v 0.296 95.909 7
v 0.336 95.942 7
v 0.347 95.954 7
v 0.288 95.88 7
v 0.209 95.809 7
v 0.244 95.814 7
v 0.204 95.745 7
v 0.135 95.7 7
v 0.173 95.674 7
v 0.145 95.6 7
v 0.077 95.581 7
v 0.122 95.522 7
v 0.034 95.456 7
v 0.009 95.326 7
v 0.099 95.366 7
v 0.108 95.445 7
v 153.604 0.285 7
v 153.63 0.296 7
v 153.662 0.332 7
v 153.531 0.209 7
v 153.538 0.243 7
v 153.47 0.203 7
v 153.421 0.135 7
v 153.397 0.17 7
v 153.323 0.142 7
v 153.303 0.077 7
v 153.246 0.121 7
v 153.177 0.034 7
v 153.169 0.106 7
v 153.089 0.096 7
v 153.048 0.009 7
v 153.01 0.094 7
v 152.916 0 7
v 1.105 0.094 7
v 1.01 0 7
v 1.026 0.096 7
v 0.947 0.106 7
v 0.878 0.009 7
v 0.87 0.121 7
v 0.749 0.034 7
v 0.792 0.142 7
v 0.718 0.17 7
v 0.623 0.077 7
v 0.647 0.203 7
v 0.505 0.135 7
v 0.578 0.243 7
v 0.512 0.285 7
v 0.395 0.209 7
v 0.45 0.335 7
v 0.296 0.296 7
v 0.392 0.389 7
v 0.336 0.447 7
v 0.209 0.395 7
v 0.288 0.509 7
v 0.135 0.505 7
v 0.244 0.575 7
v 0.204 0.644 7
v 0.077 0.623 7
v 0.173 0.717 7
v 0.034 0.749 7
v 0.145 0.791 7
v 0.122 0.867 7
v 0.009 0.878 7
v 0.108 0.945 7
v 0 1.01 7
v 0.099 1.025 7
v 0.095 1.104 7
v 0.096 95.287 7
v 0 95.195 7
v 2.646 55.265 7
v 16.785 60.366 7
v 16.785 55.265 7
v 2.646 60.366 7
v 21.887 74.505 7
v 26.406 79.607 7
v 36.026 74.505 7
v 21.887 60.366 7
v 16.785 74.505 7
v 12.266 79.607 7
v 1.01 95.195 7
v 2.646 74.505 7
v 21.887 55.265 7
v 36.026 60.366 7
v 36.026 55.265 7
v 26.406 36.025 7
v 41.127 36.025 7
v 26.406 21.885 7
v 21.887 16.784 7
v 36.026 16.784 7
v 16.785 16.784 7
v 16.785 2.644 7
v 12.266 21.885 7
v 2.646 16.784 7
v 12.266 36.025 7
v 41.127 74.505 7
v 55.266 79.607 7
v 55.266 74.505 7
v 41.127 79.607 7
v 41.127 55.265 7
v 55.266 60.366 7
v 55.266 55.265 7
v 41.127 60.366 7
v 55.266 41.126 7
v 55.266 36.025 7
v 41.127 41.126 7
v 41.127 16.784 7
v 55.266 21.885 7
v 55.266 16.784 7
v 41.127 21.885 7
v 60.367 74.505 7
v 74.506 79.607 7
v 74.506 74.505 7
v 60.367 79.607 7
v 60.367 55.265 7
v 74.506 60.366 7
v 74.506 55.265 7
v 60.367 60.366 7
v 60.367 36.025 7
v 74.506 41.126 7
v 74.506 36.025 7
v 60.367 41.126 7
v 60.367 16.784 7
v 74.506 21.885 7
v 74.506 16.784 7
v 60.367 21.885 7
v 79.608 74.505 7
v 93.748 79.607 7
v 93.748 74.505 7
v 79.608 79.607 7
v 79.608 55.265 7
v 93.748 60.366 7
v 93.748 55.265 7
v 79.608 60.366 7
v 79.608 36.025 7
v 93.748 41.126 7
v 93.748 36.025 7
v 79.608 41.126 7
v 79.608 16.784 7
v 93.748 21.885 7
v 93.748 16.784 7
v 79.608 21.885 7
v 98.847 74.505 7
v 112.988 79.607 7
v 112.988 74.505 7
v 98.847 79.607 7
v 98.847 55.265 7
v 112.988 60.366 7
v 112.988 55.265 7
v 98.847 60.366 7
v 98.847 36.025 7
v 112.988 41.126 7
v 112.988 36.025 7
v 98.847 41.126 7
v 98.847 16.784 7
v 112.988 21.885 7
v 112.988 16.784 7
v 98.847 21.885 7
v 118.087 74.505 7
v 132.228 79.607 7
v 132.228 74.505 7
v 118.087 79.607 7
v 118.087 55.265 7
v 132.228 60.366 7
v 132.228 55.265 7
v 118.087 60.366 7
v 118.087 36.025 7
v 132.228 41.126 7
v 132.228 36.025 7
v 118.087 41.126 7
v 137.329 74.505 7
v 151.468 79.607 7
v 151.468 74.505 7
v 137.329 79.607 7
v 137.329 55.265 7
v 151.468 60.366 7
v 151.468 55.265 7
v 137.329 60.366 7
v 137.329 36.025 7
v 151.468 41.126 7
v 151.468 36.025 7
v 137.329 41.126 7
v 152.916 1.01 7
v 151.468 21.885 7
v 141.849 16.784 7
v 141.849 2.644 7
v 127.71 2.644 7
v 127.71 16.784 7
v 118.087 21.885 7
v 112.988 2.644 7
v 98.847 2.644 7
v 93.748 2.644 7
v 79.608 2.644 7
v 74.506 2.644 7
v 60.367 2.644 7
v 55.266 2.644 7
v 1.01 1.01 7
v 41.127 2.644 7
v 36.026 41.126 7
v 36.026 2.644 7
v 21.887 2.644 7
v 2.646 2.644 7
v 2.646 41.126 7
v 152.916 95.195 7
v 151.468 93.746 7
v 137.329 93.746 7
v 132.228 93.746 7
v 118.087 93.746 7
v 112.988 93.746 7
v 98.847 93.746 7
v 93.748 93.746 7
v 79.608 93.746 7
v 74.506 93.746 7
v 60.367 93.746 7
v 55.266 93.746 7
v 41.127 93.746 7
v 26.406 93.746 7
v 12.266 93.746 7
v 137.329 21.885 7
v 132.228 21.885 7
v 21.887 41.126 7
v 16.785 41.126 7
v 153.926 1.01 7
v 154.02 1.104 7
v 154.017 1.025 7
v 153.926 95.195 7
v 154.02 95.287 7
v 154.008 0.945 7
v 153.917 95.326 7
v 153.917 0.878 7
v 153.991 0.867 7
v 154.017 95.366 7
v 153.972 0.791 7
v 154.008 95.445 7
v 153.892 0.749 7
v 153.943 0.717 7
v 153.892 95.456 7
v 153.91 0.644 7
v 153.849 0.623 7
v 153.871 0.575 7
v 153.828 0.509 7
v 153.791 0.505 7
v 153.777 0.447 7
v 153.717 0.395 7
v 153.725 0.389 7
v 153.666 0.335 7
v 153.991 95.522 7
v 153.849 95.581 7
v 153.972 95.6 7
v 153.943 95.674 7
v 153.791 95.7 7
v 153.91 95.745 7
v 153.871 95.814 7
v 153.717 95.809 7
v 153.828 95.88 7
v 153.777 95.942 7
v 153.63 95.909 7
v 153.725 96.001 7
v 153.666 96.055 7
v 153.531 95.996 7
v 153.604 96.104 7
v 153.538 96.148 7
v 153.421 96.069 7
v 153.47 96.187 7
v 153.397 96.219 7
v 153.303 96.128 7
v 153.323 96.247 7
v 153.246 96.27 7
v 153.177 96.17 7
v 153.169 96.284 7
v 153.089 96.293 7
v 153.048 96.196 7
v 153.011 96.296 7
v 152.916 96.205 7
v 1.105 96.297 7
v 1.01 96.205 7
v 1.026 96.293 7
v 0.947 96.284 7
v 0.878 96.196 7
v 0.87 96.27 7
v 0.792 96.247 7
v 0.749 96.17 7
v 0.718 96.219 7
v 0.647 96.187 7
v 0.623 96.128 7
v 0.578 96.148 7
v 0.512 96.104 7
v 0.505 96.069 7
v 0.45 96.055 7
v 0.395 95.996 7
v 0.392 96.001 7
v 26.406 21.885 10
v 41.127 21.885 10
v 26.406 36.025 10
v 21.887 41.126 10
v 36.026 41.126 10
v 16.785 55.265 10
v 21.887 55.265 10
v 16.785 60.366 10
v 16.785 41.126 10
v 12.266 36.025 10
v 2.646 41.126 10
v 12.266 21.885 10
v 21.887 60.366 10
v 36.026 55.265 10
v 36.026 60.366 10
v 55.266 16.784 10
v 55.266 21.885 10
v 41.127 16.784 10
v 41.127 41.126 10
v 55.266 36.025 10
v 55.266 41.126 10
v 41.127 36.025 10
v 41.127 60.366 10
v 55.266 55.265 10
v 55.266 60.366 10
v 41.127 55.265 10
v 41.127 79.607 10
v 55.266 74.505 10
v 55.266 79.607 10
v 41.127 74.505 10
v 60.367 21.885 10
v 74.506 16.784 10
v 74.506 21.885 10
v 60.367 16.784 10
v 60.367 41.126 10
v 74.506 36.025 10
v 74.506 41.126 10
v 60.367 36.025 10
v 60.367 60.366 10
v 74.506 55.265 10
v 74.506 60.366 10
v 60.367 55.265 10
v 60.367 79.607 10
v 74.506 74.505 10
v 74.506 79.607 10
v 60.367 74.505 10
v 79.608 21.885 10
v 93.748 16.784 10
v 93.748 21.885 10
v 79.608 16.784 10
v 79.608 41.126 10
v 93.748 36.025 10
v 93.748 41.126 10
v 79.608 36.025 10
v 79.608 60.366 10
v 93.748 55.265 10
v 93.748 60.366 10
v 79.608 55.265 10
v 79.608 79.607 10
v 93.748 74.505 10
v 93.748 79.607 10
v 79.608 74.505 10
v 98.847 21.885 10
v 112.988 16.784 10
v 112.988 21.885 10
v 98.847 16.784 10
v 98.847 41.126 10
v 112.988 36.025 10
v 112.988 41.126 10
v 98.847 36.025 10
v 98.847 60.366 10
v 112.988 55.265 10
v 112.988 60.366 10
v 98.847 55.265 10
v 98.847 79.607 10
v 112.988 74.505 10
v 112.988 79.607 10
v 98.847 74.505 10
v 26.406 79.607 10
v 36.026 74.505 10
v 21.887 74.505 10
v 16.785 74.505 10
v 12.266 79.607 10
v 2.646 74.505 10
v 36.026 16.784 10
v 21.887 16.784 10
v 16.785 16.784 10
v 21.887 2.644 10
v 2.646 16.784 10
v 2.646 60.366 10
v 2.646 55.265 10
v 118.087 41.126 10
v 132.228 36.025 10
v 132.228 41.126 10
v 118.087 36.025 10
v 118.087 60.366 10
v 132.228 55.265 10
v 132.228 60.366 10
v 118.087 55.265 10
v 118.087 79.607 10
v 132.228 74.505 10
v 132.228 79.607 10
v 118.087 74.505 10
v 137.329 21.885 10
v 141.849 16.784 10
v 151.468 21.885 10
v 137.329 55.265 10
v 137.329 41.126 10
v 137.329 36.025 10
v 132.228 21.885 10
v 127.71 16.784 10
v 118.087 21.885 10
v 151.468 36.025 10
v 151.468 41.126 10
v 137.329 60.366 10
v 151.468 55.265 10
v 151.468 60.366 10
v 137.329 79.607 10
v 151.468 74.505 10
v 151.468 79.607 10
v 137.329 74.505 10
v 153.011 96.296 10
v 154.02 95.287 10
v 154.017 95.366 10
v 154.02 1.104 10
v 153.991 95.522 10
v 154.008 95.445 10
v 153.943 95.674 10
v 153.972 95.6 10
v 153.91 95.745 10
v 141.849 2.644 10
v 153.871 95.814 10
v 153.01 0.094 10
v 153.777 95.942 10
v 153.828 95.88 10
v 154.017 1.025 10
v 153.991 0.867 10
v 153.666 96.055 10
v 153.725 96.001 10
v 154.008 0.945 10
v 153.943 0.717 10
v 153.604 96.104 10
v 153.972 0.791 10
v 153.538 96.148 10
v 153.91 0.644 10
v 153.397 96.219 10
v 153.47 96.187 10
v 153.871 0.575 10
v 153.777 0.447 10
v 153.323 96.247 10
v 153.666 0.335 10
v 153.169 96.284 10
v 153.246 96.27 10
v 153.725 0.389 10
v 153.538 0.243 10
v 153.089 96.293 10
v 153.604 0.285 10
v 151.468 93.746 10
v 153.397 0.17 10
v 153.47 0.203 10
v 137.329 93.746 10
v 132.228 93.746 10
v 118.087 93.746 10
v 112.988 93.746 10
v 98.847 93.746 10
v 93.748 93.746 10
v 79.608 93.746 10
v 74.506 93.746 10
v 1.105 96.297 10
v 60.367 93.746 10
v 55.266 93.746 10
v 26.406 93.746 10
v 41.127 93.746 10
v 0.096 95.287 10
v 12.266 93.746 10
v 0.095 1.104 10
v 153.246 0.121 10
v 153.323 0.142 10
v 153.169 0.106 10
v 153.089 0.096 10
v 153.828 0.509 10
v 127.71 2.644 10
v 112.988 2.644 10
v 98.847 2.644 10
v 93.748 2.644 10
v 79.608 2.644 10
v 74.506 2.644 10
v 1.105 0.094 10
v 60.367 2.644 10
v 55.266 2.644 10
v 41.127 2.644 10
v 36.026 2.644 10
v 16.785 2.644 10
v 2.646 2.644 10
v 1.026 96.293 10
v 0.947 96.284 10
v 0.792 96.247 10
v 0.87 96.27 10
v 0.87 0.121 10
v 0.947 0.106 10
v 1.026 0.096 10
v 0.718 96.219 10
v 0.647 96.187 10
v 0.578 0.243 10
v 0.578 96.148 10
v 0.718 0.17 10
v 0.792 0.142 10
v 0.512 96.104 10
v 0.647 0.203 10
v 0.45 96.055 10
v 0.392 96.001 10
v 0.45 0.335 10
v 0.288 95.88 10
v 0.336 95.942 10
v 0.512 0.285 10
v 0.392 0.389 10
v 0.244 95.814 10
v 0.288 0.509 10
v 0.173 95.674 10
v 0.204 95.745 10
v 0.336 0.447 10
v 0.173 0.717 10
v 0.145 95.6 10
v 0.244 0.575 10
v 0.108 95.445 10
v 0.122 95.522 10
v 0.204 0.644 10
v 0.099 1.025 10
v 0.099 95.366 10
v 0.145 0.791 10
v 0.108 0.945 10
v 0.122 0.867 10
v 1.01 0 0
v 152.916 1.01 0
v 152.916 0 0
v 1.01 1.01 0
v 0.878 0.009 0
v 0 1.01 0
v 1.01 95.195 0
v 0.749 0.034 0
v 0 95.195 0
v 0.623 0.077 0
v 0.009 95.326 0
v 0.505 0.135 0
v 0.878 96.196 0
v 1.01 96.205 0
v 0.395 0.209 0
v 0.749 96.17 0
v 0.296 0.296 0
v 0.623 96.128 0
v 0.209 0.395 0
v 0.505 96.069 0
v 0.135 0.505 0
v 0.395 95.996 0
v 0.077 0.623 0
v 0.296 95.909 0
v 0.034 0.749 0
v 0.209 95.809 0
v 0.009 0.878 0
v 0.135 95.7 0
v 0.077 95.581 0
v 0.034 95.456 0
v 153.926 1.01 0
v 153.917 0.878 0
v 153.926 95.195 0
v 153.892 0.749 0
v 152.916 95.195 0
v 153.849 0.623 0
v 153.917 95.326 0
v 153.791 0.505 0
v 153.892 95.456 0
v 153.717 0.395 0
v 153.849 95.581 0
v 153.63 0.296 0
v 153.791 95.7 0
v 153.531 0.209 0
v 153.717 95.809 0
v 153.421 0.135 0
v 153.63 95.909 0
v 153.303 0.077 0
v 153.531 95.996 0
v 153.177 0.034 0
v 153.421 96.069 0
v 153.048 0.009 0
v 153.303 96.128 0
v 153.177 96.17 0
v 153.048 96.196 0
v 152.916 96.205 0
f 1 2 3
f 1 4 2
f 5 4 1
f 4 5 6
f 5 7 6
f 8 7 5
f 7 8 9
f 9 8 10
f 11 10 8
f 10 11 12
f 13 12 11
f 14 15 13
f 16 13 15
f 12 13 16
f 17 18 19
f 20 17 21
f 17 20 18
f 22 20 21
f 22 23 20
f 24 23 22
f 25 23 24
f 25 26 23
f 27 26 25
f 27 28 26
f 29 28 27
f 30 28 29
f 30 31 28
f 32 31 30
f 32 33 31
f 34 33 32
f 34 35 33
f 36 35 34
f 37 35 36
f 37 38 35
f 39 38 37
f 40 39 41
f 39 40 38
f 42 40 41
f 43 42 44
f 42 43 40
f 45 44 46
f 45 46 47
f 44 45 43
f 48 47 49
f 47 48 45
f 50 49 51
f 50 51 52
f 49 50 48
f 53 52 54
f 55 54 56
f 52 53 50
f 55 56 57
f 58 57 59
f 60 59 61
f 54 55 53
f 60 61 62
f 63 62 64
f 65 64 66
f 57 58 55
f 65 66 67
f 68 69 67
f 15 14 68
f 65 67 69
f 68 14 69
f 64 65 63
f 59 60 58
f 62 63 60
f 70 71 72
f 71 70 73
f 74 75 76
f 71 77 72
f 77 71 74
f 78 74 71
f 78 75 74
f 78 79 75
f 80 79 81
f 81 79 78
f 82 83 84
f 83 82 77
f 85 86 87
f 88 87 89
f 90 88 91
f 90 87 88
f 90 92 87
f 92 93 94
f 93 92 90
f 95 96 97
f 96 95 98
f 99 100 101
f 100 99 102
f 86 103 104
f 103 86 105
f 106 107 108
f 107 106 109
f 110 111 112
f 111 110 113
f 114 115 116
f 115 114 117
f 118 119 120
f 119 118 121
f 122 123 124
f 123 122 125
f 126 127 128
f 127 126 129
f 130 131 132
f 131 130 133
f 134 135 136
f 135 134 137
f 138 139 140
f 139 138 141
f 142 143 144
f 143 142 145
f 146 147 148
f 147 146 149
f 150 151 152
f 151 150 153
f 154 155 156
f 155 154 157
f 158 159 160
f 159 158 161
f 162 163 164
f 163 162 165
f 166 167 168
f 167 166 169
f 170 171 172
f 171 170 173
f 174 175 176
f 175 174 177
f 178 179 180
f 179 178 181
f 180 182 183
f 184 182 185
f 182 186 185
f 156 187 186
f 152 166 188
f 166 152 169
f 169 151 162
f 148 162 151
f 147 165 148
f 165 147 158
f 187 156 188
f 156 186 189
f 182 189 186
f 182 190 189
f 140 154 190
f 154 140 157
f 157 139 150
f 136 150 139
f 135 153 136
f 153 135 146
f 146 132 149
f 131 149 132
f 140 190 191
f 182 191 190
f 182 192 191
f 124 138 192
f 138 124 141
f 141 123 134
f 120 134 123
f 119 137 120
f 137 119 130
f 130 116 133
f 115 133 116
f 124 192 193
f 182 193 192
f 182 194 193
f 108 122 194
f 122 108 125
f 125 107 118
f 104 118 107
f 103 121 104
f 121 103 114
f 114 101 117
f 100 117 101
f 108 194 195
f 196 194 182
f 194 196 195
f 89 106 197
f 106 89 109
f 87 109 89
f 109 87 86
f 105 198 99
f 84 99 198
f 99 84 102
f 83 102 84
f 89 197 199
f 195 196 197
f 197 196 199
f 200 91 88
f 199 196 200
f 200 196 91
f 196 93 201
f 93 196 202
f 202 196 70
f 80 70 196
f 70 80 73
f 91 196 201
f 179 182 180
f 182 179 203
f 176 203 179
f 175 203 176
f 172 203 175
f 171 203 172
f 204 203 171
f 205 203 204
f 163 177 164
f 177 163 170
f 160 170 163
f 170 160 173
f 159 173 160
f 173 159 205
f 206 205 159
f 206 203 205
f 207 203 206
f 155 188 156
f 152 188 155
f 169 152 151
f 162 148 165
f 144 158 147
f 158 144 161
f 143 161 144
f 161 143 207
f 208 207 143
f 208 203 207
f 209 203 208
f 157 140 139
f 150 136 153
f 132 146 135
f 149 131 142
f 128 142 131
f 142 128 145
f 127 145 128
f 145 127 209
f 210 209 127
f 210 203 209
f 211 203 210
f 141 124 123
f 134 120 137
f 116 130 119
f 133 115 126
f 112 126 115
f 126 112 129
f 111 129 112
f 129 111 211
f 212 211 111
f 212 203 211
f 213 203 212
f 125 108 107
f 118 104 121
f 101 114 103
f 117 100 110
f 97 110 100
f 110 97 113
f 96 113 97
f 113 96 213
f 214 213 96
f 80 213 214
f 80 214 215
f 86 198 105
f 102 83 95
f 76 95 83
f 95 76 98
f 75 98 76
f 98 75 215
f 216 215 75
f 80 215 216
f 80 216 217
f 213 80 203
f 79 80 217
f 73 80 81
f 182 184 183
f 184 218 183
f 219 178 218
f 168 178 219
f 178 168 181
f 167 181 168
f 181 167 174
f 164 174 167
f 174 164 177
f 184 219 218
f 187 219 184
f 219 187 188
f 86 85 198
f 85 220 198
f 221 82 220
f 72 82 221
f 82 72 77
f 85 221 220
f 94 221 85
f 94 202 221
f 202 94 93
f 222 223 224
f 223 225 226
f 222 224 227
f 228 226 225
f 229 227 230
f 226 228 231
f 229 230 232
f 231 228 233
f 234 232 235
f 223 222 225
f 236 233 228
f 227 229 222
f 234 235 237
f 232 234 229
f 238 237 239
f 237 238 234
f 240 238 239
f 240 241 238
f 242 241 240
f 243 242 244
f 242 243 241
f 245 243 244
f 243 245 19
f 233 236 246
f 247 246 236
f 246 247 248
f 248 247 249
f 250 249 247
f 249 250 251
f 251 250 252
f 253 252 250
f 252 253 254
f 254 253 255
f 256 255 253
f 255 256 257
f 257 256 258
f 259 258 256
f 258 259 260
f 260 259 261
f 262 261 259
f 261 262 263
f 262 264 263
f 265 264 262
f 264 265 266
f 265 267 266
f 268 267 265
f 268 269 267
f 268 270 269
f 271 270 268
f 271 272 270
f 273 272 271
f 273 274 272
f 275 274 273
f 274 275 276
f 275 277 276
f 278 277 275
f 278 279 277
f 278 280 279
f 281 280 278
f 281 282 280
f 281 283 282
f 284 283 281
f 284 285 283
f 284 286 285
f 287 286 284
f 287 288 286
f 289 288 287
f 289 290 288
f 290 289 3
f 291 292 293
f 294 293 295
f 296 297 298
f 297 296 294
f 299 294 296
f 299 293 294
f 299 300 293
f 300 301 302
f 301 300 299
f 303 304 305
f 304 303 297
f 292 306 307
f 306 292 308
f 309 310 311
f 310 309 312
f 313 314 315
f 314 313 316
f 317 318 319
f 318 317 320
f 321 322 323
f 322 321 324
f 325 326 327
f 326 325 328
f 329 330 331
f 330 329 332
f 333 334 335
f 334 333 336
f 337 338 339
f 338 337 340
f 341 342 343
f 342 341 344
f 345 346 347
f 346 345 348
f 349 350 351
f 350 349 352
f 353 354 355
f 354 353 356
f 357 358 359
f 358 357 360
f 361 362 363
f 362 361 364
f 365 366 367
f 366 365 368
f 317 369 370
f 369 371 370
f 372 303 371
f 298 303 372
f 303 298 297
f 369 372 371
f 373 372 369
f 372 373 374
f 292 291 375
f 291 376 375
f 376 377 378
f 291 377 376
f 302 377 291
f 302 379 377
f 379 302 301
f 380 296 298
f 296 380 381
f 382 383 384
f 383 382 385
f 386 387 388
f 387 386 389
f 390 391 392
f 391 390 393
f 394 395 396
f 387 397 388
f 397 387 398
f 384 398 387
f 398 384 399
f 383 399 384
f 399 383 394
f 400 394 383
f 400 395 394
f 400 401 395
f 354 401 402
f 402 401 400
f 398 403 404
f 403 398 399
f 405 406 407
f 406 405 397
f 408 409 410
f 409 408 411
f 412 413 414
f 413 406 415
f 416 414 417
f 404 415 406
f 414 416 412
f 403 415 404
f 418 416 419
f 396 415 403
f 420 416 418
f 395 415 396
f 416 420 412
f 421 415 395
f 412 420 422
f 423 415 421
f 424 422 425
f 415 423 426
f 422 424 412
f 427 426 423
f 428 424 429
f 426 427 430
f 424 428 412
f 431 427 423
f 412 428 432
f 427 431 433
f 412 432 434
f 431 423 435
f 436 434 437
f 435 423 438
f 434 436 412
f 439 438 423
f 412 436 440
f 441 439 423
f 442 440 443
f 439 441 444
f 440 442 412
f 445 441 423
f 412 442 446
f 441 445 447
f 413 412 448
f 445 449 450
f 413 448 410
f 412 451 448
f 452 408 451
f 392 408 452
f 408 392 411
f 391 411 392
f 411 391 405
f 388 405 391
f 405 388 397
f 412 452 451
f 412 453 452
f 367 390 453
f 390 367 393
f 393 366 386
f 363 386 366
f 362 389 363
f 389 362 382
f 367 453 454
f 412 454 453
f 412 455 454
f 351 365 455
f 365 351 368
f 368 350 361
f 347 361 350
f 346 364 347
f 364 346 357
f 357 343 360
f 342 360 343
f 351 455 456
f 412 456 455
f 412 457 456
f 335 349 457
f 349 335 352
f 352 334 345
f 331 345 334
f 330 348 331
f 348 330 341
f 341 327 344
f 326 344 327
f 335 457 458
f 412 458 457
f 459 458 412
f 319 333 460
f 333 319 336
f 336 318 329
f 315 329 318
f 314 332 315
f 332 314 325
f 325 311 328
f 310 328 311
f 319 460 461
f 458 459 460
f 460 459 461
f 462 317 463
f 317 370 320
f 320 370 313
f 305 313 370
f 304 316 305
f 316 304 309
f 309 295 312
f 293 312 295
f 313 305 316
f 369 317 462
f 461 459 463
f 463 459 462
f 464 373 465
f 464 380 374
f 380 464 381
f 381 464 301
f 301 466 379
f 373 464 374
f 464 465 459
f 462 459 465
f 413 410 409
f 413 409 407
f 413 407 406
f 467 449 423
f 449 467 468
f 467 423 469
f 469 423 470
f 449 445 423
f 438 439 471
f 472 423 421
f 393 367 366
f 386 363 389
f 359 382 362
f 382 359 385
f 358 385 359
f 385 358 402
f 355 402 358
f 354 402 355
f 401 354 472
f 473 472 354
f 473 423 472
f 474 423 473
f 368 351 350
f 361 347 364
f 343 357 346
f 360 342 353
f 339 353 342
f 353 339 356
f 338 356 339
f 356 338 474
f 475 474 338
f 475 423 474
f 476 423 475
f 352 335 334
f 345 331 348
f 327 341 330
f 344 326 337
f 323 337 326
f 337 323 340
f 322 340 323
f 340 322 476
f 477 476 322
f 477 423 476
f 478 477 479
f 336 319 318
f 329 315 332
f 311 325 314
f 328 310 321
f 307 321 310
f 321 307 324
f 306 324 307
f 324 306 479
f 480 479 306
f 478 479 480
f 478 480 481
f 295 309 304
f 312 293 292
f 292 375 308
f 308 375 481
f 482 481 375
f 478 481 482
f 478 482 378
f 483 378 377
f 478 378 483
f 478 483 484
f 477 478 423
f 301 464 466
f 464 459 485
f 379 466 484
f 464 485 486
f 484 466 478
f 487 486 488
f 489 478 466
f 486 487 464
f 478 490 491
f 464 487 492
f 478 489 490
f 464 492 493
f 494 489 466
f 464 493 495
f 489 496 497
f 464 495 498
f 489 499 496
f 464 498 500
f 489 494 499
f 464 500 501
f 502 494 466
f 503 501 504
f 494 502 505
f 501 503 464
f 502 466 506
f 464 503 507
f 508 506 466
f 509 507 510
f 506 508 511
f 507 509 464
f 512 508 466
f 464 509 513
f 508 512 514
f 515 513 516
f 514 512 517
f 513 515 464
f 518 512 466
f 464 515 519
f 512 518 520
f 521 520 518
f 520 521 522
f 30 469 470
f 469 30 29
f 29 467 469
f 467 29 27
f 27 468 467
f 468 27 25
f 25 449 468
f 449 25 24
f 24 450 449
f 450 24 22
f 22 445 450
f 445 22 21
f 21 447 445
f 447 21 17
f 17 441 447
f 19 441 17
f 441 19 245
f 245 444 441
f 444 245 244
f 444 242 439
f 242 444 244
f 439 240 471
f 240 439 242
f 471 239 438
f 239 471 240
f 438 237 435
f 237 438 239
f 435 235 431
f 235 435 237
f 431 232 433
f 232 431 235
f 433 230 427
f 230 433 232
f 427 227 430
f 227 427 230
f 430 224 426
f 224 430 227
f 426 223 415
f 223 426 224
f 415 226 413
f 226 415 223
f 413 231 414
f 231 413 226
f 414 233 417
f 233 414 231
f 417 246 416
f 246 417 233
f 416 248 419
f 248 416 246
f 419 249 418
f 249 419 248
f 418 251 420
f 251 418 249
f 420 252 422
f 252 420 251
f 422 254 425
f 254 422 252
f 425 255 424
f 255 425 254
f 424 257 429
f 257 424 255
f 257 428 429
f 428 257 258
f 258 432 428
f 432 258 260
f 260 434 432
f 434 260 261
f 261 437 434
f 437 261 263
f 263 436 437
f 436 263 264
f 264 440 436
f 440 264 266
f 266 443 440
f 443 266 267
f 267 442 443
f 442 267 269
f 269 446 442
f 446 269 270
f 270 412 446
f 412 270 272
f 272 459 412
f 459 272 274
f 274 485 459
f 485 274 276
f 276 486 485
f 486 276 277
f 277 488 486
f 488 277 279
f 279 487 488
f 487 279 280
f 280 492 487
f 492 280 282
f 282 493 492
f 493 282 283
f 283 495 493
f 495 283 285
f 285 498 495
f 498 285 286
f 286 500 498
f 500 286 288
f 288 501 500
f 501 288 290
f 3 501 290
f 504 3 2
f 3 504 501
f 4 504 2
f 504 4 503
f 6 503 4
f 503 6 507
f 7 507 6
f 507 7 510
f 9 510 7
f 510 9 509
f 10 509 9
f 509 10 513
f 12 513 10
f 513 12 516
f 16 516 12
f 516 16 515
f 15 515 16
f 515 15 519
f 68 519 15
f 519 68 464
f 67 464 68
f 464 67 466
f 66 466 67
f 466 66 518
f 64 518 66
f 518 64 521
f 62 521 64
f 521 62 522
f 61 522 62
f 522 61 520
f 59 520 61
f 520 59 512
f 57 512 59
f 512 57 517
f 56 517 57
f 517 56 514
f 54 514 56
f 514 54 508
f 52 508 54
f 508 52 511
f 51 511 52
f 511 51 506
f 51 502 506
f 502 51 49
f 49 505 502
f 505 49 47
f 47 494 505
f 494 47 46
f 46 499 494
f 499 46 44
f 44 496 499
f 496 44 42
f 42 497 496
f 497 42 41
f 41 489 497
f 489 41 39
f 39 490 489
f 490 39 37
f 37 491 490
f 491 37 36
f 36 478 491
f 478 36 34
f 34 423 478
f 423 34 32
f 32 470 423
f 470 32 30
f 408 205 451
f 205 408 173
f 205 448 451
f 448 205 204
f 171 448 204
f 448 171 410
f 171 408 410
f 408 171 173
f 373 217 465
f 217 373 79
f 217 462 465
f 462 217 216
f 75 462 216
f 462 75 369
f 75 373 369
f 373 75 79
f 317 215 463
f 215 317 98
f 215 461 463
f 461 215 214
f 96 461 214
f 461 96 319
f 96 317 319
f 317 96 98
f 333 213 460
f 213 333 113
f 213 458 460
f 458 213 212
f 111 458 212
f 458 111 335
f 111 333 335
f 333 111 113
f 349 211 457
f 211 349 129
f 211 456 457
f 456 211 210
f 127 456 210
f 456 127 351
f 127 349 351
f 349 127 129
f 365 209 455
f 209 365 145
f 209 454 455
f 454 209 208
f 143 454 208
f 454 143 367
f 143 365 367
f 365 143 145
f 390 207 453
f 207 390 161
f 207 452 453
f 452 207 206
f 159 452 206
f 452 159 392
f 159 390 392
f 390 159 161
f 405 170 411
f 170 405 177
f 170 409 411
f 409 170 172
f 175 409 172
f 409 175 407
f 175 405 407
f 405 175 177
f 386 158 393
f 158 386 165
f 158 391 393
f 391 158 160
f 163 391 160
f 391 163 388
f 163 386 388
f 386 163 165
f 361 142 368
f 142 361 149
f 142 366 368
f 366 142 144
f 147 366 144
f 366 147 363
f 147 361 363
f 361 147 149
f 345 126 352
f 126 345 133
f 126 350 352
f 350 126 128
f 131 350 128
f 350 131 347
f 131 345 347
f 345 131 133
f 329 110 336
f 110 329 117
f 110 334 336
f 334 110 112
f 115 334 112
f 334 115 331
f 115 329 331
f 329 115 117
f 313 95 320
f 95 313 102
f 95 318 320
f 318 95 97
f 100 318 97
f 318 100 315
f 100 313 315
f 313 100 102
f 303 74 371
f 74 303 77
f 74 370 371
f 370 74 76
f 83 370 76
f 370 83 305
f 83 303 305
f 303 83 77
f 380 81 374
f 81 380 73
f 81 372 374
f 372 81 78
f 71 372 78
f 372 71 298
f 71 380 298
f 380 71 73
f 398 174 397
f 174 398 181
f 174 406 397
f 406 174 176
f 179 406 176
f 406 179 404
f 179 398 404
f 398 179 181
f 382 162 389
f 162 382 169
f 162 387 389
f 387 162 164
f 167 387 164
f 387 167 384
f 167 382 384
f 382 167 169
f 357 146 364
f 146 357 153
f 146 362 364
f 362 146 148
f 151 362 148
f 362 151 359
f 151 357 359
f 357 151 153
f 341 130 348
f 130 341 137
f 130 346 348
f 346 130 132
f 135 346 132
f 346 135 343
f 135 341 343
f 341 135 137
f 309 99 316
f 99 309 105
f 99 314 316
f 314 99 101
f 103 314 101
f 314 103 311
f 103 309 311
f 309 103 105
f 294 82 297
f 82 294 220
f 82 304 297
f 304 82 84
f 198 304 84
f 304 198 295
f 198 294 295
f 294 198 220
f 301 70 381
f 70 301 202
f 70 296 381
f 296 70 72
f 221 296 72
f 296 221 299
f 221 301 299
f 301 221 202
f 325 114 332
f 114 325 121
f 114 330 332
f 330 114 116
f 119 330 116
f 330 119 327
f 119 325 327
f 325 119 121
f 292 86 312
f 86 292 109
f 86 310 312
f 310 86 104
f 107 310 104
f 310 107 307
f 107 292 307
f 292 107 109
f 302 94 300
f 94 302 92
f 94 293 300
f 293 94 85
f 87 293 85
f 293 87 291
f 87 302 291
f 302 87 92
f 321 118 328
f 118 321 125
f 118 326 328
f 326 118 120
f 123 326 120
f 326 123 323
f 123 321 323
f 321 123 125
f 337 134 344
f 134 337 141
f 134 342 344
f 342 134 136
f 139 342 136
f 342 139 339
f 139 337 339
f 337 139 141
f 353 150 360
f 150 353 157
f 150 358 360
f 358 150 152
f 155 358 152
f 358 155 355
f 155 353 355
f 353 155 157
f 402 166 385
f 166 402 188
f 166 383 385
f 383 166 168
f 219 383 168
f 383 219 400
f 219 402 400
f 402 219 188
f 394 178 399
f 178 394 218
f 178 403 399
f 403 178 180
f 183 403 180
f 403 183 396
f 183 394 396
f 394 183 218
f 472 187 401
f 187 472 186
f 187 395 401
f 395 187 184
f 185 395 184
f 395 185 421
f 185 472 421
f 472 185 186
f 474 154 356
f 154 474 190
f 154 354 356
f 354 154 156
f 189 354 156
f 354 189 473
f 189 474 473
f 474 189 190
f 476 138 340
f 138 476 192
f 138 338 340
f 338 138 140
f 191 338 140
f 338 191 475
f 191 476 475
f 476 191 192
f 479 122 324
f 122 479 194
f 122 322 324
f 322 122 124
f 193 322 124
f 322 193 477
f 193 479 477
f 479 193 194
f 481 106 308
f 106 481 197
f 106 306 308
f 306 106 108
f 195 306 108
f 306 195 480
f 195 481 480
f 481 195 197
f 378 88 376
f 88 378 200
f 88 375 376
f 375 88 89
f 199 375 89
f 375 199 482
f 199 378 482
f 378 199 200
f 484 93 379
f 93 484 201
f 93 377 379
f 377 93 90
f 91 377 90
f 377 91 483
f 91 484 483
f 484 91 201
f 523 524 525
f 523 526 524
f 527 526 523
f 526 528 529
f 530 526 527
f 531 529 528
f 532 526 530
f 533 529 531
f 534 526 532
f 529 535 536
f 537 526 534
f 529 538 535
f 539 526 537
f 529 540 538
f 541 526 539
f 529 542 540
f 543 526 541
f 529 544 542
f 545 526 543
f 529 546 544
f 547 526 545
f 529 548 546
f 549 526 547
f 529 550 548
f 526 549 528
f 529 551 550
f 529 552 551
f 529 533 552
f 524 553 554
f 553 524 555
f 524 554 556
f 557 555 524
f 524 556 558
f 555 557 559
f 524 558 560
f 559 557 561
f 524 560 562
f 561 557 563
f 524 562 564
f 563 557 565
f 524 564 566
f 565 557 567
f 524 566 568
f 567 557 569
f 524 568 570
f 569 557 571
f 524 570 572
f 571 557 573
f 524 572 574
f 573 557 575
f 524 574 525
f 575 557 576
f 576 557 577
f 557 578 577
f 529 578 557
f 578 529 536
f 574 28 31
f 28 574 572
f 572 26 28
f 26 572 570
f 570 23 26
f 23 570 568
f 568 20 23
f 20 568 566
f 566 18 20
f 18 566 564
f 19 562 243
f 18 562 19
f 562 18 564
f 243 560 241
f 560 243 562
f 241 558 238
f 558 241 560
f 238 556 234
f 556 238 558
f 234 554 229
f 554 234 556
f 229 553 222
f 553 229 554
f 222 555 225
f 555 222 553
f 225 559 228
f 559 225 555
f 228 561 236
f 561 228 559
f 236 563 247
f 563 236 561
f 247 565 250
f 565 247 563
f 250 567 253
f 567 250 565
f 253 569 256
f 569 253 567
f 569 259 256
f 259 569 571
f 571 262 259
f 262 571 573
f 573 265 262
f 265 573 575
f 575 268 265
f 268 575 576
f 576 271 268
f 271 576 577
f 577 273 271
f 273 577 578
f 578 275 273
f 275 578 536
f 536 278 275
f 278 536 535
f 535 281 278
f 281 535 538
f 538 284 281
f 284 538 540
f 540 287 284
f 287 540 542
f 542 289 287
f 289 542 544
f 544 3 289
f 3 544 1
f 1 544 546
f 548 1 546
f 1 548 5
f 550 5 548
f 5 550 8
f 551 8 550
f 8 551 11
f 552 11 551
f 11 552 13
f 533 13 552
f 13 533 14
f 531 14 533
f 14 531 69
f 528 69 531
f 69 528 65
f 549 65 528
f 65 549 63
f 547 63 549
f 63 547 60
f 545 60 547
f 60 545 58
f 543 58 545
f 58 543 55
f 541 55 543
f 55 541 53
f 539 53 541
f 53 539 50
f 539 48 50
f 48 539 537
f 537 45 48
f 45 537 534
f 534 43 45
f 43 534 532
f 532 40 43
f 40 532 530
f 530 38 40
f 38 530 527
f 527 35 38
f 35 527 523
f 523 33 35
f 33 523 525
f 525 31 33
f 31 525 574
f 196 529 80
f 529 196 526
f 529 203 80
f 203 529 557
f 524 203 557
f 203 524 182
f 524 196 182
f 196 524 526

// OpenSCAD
// file: plate.scad
// Thickness of entire plate
plate_thickness=3;
// Unit square length, from Cherry MX data sheet
unit=19.05;
// Hole size. 14 is standard
hole_size=14.2;


// length, in units, of board
width_in_units=15;
// Height, in units, of board
height_in_units=5;

// Radius of mounting holes
mounting_hole_radius=2;

// whether to use the fancy cutout switches
fancy_hole = false;


// height of switch clasp cutouts
cutout_height = 3;
// width of switch clasp cutouts
cutoutwidth = 1;

//calculated vars
width=width_in_units*unit;
height=height_in_units*unit;

sixty_percent_holes = [[1+1/3,3.5], [13+2/3,3.5], [6.75,2.5], [6.75,2.5], [14.8,2], [.2,2], [10,0.5]];

module plate(width, height, thickness){
	cube([width,height,thickness]);
}

module switch_hole(){
	cube([hole_size,hole_size,plate_thickness]);

	if(fancy_hole){
		translate([-cutoutwidth,1,0])
		cube([hole_size+2*cutoutwidth,cutout_height,plate_thickness]);

		translate([-cutoutwidth,hole_size-cutoutwidth-cutout_height,0])
		cube([hole_size+2*cutoutwidth,cutout_height,plate_thickness]);
	}
}

module hole_matrix(holes,startx,starty){
	for (key = holes){
		translate([startx+unit*key[0], starty-unit*key[1], 0]){
			translate([(unit*key[2]-hole_size)/2,(unit - hole_size)/2, 0]){
				switch_hole();
			}
		}
	}
}

module mounting_holes(holes){
	for (hole = holes) {
		translate([hole[0] * unit, hole[1] * unit]) {
			cylinder(h=plate_thickness,r=mounting_hole_radius, $fn=12);
		}
	}
}

module full_plate(width, height, key_holes, mounting_holes=sixty_percent_holes){
	difference(){
		plate(width,height);
		hole_matrix(key_holes,0,height-unit);
		mounting_holes(mounting_holes);
	}
}
// main file
include <plate.scad>

//poker keyboard layout layer
key_holes = [
//start ROW 0
[0,0,1], [1,0,1], [2,0,1], [3,0,1], [4,0,1], [5,0,1], [6,0,1], [7,0,1], [8,0,1], [9,0,1], [10,0,1], [11,0,1], [12,0,1], [13,0,2],
//start ROW 1
[0,1,1.5], [1.5,1,1], [2.5,1,1], [3.5,1,1], [4.5,1,1], [5.5,1,1], [6.5,1,1], [7.5,1,1], [8.5,1,1], [9.5,1,1], [10.5,1,1], [11.5,1,1], [12.5,1,1], [13.5,1,1.5],
//start ROW 2
[0,2,1.75], [1.75,2,1], [2.75,2,1], [3.75,2,1], [4.75,2,1], [5.75,2,1], [6.75,2,1], [7.75,2,1], [8.75,2,1], [9.75,2,1], [10.75,2,1], [11.75,2,1], [12.75,2,2.25],
//start ROW 3
[0,3,2.25], [2.25,3,1], [3.25,3,1], [4.25,3,1], [5.25,3,1], [6.25,3,1], [7.25,3,1], [8.25,3,1], [9.25,3,1], [10.25,3,1], [11.25,3,1], [12.25,3,2.75],
//start ROW 4
[0,4,1.25], [1.25,4,1.25], [2.5 ,4,1.25], [3.75,4,6.25], [10,4,1.25], [11.25,4,1.25], [12.5,4,1.25], [13.75,4,1.25],
];

/* full_plate(width, height, pokerkeyboard); */


module left() {
    translate([0, 0, 0]) {
        scale([1.01,1.01, 1]){
            translate([0,0,7]) linear_extrude(height=3) {
                import("operation_trogdor_left_revised.dxf");
            }

            translate([1,1,0]) linear_extrude(height=7) {
                difference() {
                    offset(1, $fn=48) square([152.402 - 2,  95.252 - 2]);
                    square([152.402 - 2,  95.252 - 2]);
                }
            }
        }
    }
}


module right() {
    translate([170, 0, 0]) {
        scale([1.01,1.01, 1]){
            translate([0,0,7]) linear_extrude(height=3) {
                import("operation_trogdor_right.dxf");
            }

            translate([1,1,0]) linear_extrude(height=7) {
                difference() {
                    offset(1, $fn=48) square([152.402 - 2,  95.252 - 2]);
                    square([152.402 - 2,  95.252 - 2]);
                }
            }
        }
    }
}

left();
